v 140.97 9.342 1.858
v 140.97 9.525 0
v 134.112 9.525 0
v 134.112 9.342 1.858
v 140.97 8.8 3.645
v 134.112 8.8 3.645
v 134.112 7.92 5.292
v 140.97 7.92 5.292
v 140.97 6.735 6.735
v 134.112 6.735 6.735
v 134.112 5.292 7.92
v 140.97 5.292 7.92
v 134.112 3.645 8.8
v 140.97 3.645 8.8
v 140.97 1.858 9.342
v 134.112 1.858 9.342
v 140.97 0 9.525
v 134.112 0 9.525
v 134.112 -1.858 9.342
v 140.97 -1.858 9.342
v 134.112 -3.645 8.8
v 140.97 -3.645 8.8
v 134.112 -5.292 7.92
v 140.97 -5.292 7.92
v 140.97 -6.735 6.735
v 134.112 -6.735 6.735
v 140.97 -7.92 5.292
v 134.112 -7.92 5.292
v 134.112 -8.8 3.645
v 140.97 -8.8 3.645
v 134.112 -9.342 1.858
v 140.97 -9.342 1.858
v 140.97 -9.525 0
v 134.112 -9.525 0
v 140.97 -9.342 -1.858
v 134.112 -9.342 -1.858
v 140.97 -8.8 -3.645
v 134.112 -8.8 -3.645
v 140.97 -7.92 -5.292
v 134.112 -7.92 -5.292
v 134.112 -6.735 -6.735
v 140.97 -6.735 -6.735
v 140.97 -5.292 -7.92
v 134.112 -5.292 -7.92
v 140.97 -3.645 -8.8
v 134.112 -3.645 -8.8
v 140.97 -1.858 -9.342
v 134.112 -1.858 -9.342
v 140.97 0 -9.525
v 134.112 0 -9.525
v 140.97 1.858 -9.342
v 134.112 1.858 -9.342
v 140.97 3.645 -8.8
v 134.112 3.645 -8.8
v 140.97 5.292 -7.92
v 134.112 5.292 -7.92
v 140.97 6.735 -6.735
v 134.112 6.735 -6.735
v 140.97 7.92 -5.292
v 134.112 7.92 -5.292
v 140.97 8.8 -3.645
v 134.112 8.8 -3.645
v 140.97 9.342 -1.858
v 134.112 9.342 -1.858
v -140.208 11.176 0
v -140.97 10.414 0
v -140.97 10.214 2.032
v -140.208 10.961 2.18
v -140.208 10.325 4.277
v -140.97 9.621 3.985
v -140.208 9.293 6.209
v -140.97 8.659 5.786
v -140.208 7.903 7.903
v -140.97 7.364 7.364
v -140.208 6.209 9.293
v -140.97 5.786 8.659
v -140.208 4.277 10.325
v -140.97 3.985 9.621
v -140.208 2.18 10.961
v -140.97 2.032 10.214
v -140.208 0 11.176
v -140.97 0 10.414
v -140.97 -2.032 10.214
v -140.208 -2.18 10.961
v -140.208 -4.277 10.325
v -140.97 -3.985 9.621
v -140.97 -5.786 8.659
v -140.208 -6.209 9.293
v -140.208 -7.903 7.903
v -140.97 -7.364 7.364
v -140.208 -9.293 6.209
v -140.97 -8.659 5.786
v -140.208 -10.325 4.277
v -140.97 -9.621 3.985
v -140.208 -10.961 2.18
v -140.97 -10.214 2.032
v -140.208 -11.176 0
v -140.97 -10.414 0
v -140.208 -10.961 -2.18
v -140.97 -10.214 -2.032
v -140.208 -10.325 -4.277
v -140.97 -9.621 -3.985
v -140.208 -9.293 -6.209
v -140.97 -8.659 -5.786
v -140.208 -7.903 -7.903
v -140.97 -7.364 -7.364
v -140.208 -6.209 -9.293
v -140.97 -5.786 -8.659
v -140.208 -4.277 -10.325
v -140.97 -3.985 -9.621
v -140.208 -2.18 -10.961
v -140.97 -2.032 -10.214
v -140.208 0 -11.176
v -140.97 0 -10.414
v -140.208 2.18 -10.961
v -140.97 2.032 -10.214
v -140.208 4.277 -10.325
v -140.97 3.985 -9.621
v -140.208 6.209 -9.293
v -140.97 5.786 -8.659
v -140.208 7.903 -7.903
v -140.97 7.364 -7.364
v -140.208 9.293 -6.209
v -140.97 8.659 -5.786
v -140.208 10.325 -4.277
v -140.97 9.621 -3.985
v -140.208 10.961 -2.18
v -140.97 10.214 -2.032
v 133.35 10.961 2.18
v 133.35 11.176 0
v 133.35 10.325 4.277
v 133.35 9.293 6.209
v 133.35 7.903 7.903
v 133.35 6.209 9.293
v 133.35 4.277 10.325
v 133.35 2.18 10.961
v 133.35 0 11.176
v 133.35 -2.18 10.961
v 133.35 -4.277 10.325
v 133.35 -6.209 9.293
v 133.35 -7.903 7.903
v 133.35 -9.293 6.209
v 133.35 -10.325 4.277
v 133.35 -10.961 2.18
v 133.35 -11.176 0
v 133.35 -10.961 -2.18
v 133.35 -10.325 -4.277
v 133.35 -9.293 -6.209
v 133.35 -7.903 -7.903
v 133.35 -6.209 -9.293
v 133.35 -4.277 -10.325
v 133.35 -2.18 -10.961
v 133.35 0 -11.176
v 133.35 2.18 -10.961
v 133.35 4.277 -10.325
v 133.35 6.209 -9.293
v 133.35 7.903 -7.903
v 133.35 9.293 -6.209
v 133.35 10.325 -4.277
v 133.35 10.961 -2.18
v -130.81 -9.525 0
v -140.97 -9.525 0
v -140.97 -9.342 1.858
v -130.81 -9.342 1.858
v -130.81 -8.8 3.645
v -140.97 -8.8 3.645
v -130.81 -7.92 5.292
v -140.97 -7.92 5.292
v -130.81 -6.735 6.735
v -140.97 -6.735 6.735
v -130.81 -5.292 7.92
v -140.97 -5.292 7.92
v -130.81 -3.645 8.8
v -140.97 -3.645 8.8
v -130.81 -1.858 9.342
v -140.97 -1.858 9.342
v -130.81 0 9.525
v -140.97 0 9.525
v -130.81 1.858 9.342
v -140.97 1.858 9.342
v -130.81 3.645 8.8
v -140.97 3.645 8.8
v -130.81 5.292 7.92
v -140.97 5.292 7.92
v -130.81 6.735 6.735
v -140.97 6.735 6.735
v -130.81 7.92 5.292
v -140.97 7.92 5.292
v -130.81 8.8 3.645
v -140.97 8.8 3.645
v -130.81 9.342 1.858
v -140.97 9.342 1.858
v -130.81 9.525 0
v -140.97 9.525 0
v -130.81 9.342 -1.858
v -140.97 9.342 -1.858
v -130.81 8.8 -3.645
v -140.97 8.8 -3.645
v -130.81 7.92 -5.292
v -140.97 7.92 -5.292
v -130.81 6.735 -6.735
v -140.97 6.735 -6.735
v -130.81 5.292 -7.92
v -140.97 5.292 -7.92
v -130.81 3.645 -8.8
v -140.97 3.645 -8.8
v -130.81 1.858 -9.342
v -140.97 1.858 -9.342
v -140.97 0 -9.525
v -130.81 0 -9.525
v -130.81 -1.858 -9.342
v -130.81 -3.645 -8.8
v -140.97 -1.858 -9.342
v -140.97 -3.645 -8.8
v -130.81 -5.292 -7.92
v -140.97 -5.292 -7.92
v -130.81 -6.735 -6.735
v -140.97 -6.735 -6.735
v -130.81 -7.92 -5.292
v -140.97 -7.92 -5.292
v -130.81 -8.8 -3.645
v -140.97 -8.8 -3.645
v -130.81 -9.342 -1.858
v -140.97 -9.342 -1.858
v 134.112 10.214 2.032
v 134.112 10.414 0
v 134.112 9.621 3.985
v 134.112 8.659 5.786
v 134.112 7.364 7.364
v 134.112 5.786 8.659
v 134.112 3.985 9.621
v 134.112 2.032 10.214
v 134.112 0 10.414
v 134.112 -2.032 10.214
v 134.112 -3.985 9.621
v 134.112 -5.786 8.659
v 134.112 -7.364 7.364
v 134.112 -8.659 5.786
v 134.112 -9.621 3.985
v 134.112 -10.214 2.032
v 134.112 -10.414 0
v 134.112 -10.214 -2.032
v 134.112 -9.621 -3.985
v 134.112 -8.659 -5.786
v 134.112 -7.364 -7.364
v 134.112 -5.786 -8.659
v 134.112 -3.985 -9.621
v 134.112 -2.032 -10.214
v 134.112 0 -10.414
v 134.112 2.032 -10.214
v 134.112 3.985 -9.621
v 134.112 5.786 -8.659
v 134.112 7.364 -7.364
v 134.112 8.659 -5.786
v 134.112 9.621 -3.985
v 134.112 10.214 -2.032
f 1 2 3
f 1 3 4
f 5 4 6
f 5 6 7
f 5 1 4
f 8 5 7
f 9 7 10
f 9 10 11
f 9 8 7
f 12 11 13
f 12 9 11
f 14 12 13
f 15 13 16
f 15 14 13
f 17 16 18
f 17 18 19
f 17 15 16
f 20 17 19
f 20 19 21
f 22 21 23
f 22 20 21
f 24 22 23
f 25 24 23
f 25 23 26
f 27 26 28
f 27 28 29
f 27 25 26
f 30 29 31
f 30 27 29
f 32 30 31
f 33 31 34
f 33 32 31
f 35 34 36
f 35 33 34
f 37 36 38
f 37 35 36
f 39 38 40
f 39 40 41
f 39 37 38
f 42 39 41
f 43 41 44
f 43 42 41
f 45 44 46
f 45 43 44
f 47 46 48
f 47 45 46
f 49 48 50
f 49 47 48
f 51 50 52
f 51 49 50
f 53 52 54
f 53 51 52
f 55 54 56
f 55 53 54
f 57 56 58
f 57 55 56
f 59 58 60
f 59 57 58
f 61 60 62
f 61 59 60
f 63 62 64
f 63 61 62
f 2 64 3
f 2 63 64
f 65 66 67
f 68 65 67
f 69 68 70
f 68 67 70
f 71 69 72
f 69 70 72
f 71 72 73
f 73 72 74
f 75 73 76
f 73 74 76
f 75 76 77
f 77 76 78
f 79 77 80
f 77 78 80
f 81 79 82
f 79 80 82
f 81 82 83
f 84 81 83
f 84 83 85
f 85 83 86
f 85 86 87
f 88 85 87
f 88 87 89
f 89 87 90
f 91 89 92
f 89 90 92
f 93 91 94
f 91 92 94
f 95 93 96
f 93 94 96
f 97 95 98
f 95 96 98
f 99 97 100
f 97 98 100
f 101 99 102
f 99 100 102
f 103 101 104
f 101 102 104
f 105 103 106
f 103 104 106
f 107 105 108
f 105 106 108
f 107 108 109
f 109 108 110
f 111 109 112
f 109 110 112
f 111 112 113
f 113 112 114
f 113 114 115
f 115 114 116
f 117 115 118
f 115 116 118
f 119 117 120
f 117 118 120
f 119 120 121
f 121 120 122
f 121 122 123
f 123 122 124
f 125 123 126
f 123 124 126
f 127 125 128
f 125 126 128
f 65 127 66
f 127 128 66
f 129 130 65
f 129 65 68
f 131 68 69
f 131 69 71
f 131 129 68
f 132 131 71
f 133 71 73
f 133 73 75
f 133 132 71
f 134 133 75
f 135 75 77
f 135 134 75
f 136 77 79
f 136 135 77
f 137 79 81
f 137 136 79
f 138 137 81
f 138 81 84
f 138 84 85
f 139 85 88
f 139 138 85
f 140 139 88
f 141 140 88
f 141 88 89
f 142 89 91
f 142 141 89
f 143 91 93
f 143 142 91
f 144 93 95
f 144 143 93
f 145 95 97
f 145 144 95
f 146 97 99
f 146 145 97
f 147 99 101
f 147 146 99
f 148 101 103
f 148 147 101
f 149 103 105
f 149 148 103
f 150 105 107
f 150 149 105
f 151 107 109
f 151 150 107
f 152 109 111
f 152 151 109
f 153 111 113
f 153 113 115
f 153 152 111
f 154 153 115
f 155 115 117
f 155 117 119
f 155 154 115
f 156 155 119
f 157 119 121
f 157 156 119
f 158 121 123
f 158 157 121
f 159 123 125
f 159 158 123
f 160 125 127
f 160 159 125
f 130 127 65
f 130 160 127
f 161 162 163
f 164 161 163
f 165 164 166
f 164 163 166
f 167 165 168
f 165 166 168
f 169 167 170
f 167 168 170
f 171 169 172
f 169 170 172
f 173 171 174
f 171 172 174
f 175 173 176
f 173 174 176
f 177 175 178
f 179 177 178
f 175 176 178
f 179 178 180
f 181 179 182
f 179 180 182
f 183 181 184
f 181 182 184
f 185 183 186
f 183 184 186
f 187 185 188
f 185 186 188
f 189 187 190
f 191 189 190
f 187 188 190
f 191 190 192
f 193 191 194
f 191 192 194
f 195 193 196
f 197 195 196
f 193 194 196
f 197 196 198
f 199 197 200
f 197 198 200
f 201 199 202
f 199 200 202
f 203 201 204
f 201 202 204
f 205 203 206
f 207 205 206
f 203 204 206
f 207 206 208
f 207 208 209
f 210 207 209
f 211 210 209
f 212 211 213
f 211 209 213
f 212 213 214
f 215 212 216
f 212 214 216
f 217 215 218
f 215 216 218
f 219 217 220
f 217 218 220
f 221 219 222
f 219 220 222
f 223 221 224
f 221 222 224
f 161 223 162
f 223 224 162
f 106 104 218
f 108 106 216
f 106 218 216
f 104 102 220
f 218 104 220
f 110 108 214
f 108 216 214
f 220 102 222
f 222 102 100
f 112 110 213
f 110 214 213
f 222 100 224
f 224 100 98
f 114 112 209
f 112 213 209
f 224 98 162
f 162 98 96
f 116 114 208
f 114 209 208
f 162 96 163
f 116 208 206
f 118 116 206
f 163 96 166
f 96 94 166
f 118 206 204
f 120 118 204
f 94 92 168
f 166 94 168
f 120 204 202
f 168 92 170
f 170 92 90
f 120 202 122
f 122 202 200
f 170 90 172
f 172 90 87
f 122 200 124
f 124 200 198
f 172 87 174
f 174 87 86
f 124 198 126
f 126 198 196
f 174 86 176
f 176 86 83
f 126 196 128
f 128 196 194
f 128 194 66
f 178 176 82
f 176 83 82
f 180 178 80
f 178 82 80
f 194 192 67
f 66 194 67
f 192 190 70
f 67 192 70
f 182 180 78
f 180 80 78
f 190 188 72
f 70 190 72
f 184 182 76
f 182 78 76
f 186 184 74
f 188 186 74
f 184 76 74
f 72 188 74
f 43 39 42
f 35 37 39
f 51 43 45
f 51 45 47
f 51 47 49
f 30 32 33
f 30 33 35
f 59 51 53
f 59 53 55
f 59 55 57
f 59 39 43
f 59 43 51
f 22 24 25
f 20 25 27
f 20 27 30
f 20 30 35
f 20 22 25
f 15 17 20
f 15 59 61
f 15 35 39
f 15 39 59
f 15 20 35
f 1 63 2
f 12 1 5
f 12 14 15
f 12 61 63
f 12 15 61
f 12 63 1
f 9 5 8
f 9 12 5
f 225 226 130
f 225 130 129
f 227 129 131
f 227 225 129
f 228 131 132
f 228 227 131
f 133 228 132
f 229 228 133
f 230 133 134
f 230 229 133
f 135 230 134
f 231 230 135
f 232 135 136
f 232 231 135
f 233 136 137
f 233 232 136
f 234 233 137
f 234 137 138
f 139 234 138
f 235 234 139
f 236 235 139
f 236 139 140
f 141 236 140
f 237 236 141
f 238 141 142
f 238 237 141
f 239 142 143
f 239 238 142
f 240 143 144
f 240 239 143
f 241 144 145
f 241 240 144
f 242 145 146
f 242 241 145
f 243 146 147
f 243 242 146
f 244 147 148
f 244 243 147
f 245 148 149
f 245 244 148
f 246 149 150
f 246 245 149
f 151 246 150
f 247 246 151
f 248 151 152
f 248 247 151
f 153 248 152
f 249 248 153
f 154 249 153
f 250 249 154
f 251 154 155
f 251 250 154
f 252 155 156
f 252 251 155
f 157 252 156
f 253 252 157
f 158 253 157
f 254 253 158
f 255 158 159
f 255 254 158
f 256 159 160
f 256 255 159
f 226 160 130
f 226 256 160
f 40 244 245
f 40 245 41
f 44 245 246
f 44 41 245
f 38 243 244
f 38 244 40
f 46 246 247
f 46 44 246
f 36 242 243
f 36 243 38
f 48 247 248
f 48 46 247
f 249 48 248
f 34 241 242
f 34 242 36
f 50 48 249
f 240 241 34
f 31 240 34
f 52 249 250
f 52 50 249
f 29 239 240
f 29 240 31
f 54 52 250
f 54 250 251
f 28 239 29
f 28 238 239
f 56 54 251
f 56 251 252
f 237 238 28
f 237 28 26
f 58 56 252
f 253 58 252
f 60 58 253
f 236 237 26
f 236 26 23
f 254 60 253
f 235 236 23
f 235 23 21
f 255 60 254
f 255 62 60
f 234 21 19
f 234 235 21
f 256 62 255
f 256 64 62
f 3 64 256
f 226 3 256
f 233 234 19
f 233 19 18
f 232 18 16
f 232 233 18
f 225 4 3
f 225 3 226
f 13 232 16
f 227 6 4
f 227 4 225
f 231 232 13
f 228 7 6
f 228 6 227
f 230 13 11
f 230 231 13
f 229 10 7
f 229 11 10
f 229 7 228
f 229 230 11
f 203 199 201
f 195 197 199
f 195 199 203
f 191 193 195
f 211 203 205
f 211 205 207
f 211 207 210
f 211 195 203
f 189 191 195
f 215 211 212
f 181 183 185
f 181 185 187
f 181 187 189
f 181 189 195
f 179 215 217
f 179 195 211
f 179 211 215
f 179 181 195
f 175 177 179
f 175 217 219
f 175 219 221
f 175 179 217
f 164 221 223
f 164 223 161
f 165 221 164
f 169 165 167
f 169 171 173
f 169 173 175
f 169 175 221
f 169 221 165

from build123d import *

# Parameters (mm, degrees)
F0_R     = 11.176
F1_DEPTH = 140.97
F2_R     = 11.176
F2_R_2   = 9.525
F3_DEPTH = 6.858
F4_SIZE  = 0.762
F5_R     = 9.525
F6_DEPTH = 10.16


with BuildPart() as f1:
    # F0 (on Right) → F1 (new body, symmetric)
    with BuildSketch(Plane.YZ):
        Circle(F0_R)
    extrude(amount=F1_DEPTH, both=True)

    # F2 (on face) → F3 (cut)
    with BuildSketch(Plane.YZ.offset(140.97)):
        Circle(F2_R)
        Circle(F2_R_2, mode=Mode.SUBTRACT)
    extrude(amount=-F3_DEPTH, mode=Mode.SUBTRACT)

    # F4
    f4_edges = [f1.edges().sort_by_distance(p)[0] for p in [
        (-140.97, -11.176, 0),
        (134.112, -11.176, 0),
    ]]
    chamfer(f4_edges, length=F4_SIZE)

    # F5 (on face) → F6 (cut)
    with BuildSketch(Plane(origin=(-140.97, 0, 0), x_dir=(0, -1, 0), z_dir=(-1, 0, 0))):
        Circle(F5_R)
    extrude(amount=-F6_DEPTH, mode=Mode.SUBTRACT)


solid = f1.part
